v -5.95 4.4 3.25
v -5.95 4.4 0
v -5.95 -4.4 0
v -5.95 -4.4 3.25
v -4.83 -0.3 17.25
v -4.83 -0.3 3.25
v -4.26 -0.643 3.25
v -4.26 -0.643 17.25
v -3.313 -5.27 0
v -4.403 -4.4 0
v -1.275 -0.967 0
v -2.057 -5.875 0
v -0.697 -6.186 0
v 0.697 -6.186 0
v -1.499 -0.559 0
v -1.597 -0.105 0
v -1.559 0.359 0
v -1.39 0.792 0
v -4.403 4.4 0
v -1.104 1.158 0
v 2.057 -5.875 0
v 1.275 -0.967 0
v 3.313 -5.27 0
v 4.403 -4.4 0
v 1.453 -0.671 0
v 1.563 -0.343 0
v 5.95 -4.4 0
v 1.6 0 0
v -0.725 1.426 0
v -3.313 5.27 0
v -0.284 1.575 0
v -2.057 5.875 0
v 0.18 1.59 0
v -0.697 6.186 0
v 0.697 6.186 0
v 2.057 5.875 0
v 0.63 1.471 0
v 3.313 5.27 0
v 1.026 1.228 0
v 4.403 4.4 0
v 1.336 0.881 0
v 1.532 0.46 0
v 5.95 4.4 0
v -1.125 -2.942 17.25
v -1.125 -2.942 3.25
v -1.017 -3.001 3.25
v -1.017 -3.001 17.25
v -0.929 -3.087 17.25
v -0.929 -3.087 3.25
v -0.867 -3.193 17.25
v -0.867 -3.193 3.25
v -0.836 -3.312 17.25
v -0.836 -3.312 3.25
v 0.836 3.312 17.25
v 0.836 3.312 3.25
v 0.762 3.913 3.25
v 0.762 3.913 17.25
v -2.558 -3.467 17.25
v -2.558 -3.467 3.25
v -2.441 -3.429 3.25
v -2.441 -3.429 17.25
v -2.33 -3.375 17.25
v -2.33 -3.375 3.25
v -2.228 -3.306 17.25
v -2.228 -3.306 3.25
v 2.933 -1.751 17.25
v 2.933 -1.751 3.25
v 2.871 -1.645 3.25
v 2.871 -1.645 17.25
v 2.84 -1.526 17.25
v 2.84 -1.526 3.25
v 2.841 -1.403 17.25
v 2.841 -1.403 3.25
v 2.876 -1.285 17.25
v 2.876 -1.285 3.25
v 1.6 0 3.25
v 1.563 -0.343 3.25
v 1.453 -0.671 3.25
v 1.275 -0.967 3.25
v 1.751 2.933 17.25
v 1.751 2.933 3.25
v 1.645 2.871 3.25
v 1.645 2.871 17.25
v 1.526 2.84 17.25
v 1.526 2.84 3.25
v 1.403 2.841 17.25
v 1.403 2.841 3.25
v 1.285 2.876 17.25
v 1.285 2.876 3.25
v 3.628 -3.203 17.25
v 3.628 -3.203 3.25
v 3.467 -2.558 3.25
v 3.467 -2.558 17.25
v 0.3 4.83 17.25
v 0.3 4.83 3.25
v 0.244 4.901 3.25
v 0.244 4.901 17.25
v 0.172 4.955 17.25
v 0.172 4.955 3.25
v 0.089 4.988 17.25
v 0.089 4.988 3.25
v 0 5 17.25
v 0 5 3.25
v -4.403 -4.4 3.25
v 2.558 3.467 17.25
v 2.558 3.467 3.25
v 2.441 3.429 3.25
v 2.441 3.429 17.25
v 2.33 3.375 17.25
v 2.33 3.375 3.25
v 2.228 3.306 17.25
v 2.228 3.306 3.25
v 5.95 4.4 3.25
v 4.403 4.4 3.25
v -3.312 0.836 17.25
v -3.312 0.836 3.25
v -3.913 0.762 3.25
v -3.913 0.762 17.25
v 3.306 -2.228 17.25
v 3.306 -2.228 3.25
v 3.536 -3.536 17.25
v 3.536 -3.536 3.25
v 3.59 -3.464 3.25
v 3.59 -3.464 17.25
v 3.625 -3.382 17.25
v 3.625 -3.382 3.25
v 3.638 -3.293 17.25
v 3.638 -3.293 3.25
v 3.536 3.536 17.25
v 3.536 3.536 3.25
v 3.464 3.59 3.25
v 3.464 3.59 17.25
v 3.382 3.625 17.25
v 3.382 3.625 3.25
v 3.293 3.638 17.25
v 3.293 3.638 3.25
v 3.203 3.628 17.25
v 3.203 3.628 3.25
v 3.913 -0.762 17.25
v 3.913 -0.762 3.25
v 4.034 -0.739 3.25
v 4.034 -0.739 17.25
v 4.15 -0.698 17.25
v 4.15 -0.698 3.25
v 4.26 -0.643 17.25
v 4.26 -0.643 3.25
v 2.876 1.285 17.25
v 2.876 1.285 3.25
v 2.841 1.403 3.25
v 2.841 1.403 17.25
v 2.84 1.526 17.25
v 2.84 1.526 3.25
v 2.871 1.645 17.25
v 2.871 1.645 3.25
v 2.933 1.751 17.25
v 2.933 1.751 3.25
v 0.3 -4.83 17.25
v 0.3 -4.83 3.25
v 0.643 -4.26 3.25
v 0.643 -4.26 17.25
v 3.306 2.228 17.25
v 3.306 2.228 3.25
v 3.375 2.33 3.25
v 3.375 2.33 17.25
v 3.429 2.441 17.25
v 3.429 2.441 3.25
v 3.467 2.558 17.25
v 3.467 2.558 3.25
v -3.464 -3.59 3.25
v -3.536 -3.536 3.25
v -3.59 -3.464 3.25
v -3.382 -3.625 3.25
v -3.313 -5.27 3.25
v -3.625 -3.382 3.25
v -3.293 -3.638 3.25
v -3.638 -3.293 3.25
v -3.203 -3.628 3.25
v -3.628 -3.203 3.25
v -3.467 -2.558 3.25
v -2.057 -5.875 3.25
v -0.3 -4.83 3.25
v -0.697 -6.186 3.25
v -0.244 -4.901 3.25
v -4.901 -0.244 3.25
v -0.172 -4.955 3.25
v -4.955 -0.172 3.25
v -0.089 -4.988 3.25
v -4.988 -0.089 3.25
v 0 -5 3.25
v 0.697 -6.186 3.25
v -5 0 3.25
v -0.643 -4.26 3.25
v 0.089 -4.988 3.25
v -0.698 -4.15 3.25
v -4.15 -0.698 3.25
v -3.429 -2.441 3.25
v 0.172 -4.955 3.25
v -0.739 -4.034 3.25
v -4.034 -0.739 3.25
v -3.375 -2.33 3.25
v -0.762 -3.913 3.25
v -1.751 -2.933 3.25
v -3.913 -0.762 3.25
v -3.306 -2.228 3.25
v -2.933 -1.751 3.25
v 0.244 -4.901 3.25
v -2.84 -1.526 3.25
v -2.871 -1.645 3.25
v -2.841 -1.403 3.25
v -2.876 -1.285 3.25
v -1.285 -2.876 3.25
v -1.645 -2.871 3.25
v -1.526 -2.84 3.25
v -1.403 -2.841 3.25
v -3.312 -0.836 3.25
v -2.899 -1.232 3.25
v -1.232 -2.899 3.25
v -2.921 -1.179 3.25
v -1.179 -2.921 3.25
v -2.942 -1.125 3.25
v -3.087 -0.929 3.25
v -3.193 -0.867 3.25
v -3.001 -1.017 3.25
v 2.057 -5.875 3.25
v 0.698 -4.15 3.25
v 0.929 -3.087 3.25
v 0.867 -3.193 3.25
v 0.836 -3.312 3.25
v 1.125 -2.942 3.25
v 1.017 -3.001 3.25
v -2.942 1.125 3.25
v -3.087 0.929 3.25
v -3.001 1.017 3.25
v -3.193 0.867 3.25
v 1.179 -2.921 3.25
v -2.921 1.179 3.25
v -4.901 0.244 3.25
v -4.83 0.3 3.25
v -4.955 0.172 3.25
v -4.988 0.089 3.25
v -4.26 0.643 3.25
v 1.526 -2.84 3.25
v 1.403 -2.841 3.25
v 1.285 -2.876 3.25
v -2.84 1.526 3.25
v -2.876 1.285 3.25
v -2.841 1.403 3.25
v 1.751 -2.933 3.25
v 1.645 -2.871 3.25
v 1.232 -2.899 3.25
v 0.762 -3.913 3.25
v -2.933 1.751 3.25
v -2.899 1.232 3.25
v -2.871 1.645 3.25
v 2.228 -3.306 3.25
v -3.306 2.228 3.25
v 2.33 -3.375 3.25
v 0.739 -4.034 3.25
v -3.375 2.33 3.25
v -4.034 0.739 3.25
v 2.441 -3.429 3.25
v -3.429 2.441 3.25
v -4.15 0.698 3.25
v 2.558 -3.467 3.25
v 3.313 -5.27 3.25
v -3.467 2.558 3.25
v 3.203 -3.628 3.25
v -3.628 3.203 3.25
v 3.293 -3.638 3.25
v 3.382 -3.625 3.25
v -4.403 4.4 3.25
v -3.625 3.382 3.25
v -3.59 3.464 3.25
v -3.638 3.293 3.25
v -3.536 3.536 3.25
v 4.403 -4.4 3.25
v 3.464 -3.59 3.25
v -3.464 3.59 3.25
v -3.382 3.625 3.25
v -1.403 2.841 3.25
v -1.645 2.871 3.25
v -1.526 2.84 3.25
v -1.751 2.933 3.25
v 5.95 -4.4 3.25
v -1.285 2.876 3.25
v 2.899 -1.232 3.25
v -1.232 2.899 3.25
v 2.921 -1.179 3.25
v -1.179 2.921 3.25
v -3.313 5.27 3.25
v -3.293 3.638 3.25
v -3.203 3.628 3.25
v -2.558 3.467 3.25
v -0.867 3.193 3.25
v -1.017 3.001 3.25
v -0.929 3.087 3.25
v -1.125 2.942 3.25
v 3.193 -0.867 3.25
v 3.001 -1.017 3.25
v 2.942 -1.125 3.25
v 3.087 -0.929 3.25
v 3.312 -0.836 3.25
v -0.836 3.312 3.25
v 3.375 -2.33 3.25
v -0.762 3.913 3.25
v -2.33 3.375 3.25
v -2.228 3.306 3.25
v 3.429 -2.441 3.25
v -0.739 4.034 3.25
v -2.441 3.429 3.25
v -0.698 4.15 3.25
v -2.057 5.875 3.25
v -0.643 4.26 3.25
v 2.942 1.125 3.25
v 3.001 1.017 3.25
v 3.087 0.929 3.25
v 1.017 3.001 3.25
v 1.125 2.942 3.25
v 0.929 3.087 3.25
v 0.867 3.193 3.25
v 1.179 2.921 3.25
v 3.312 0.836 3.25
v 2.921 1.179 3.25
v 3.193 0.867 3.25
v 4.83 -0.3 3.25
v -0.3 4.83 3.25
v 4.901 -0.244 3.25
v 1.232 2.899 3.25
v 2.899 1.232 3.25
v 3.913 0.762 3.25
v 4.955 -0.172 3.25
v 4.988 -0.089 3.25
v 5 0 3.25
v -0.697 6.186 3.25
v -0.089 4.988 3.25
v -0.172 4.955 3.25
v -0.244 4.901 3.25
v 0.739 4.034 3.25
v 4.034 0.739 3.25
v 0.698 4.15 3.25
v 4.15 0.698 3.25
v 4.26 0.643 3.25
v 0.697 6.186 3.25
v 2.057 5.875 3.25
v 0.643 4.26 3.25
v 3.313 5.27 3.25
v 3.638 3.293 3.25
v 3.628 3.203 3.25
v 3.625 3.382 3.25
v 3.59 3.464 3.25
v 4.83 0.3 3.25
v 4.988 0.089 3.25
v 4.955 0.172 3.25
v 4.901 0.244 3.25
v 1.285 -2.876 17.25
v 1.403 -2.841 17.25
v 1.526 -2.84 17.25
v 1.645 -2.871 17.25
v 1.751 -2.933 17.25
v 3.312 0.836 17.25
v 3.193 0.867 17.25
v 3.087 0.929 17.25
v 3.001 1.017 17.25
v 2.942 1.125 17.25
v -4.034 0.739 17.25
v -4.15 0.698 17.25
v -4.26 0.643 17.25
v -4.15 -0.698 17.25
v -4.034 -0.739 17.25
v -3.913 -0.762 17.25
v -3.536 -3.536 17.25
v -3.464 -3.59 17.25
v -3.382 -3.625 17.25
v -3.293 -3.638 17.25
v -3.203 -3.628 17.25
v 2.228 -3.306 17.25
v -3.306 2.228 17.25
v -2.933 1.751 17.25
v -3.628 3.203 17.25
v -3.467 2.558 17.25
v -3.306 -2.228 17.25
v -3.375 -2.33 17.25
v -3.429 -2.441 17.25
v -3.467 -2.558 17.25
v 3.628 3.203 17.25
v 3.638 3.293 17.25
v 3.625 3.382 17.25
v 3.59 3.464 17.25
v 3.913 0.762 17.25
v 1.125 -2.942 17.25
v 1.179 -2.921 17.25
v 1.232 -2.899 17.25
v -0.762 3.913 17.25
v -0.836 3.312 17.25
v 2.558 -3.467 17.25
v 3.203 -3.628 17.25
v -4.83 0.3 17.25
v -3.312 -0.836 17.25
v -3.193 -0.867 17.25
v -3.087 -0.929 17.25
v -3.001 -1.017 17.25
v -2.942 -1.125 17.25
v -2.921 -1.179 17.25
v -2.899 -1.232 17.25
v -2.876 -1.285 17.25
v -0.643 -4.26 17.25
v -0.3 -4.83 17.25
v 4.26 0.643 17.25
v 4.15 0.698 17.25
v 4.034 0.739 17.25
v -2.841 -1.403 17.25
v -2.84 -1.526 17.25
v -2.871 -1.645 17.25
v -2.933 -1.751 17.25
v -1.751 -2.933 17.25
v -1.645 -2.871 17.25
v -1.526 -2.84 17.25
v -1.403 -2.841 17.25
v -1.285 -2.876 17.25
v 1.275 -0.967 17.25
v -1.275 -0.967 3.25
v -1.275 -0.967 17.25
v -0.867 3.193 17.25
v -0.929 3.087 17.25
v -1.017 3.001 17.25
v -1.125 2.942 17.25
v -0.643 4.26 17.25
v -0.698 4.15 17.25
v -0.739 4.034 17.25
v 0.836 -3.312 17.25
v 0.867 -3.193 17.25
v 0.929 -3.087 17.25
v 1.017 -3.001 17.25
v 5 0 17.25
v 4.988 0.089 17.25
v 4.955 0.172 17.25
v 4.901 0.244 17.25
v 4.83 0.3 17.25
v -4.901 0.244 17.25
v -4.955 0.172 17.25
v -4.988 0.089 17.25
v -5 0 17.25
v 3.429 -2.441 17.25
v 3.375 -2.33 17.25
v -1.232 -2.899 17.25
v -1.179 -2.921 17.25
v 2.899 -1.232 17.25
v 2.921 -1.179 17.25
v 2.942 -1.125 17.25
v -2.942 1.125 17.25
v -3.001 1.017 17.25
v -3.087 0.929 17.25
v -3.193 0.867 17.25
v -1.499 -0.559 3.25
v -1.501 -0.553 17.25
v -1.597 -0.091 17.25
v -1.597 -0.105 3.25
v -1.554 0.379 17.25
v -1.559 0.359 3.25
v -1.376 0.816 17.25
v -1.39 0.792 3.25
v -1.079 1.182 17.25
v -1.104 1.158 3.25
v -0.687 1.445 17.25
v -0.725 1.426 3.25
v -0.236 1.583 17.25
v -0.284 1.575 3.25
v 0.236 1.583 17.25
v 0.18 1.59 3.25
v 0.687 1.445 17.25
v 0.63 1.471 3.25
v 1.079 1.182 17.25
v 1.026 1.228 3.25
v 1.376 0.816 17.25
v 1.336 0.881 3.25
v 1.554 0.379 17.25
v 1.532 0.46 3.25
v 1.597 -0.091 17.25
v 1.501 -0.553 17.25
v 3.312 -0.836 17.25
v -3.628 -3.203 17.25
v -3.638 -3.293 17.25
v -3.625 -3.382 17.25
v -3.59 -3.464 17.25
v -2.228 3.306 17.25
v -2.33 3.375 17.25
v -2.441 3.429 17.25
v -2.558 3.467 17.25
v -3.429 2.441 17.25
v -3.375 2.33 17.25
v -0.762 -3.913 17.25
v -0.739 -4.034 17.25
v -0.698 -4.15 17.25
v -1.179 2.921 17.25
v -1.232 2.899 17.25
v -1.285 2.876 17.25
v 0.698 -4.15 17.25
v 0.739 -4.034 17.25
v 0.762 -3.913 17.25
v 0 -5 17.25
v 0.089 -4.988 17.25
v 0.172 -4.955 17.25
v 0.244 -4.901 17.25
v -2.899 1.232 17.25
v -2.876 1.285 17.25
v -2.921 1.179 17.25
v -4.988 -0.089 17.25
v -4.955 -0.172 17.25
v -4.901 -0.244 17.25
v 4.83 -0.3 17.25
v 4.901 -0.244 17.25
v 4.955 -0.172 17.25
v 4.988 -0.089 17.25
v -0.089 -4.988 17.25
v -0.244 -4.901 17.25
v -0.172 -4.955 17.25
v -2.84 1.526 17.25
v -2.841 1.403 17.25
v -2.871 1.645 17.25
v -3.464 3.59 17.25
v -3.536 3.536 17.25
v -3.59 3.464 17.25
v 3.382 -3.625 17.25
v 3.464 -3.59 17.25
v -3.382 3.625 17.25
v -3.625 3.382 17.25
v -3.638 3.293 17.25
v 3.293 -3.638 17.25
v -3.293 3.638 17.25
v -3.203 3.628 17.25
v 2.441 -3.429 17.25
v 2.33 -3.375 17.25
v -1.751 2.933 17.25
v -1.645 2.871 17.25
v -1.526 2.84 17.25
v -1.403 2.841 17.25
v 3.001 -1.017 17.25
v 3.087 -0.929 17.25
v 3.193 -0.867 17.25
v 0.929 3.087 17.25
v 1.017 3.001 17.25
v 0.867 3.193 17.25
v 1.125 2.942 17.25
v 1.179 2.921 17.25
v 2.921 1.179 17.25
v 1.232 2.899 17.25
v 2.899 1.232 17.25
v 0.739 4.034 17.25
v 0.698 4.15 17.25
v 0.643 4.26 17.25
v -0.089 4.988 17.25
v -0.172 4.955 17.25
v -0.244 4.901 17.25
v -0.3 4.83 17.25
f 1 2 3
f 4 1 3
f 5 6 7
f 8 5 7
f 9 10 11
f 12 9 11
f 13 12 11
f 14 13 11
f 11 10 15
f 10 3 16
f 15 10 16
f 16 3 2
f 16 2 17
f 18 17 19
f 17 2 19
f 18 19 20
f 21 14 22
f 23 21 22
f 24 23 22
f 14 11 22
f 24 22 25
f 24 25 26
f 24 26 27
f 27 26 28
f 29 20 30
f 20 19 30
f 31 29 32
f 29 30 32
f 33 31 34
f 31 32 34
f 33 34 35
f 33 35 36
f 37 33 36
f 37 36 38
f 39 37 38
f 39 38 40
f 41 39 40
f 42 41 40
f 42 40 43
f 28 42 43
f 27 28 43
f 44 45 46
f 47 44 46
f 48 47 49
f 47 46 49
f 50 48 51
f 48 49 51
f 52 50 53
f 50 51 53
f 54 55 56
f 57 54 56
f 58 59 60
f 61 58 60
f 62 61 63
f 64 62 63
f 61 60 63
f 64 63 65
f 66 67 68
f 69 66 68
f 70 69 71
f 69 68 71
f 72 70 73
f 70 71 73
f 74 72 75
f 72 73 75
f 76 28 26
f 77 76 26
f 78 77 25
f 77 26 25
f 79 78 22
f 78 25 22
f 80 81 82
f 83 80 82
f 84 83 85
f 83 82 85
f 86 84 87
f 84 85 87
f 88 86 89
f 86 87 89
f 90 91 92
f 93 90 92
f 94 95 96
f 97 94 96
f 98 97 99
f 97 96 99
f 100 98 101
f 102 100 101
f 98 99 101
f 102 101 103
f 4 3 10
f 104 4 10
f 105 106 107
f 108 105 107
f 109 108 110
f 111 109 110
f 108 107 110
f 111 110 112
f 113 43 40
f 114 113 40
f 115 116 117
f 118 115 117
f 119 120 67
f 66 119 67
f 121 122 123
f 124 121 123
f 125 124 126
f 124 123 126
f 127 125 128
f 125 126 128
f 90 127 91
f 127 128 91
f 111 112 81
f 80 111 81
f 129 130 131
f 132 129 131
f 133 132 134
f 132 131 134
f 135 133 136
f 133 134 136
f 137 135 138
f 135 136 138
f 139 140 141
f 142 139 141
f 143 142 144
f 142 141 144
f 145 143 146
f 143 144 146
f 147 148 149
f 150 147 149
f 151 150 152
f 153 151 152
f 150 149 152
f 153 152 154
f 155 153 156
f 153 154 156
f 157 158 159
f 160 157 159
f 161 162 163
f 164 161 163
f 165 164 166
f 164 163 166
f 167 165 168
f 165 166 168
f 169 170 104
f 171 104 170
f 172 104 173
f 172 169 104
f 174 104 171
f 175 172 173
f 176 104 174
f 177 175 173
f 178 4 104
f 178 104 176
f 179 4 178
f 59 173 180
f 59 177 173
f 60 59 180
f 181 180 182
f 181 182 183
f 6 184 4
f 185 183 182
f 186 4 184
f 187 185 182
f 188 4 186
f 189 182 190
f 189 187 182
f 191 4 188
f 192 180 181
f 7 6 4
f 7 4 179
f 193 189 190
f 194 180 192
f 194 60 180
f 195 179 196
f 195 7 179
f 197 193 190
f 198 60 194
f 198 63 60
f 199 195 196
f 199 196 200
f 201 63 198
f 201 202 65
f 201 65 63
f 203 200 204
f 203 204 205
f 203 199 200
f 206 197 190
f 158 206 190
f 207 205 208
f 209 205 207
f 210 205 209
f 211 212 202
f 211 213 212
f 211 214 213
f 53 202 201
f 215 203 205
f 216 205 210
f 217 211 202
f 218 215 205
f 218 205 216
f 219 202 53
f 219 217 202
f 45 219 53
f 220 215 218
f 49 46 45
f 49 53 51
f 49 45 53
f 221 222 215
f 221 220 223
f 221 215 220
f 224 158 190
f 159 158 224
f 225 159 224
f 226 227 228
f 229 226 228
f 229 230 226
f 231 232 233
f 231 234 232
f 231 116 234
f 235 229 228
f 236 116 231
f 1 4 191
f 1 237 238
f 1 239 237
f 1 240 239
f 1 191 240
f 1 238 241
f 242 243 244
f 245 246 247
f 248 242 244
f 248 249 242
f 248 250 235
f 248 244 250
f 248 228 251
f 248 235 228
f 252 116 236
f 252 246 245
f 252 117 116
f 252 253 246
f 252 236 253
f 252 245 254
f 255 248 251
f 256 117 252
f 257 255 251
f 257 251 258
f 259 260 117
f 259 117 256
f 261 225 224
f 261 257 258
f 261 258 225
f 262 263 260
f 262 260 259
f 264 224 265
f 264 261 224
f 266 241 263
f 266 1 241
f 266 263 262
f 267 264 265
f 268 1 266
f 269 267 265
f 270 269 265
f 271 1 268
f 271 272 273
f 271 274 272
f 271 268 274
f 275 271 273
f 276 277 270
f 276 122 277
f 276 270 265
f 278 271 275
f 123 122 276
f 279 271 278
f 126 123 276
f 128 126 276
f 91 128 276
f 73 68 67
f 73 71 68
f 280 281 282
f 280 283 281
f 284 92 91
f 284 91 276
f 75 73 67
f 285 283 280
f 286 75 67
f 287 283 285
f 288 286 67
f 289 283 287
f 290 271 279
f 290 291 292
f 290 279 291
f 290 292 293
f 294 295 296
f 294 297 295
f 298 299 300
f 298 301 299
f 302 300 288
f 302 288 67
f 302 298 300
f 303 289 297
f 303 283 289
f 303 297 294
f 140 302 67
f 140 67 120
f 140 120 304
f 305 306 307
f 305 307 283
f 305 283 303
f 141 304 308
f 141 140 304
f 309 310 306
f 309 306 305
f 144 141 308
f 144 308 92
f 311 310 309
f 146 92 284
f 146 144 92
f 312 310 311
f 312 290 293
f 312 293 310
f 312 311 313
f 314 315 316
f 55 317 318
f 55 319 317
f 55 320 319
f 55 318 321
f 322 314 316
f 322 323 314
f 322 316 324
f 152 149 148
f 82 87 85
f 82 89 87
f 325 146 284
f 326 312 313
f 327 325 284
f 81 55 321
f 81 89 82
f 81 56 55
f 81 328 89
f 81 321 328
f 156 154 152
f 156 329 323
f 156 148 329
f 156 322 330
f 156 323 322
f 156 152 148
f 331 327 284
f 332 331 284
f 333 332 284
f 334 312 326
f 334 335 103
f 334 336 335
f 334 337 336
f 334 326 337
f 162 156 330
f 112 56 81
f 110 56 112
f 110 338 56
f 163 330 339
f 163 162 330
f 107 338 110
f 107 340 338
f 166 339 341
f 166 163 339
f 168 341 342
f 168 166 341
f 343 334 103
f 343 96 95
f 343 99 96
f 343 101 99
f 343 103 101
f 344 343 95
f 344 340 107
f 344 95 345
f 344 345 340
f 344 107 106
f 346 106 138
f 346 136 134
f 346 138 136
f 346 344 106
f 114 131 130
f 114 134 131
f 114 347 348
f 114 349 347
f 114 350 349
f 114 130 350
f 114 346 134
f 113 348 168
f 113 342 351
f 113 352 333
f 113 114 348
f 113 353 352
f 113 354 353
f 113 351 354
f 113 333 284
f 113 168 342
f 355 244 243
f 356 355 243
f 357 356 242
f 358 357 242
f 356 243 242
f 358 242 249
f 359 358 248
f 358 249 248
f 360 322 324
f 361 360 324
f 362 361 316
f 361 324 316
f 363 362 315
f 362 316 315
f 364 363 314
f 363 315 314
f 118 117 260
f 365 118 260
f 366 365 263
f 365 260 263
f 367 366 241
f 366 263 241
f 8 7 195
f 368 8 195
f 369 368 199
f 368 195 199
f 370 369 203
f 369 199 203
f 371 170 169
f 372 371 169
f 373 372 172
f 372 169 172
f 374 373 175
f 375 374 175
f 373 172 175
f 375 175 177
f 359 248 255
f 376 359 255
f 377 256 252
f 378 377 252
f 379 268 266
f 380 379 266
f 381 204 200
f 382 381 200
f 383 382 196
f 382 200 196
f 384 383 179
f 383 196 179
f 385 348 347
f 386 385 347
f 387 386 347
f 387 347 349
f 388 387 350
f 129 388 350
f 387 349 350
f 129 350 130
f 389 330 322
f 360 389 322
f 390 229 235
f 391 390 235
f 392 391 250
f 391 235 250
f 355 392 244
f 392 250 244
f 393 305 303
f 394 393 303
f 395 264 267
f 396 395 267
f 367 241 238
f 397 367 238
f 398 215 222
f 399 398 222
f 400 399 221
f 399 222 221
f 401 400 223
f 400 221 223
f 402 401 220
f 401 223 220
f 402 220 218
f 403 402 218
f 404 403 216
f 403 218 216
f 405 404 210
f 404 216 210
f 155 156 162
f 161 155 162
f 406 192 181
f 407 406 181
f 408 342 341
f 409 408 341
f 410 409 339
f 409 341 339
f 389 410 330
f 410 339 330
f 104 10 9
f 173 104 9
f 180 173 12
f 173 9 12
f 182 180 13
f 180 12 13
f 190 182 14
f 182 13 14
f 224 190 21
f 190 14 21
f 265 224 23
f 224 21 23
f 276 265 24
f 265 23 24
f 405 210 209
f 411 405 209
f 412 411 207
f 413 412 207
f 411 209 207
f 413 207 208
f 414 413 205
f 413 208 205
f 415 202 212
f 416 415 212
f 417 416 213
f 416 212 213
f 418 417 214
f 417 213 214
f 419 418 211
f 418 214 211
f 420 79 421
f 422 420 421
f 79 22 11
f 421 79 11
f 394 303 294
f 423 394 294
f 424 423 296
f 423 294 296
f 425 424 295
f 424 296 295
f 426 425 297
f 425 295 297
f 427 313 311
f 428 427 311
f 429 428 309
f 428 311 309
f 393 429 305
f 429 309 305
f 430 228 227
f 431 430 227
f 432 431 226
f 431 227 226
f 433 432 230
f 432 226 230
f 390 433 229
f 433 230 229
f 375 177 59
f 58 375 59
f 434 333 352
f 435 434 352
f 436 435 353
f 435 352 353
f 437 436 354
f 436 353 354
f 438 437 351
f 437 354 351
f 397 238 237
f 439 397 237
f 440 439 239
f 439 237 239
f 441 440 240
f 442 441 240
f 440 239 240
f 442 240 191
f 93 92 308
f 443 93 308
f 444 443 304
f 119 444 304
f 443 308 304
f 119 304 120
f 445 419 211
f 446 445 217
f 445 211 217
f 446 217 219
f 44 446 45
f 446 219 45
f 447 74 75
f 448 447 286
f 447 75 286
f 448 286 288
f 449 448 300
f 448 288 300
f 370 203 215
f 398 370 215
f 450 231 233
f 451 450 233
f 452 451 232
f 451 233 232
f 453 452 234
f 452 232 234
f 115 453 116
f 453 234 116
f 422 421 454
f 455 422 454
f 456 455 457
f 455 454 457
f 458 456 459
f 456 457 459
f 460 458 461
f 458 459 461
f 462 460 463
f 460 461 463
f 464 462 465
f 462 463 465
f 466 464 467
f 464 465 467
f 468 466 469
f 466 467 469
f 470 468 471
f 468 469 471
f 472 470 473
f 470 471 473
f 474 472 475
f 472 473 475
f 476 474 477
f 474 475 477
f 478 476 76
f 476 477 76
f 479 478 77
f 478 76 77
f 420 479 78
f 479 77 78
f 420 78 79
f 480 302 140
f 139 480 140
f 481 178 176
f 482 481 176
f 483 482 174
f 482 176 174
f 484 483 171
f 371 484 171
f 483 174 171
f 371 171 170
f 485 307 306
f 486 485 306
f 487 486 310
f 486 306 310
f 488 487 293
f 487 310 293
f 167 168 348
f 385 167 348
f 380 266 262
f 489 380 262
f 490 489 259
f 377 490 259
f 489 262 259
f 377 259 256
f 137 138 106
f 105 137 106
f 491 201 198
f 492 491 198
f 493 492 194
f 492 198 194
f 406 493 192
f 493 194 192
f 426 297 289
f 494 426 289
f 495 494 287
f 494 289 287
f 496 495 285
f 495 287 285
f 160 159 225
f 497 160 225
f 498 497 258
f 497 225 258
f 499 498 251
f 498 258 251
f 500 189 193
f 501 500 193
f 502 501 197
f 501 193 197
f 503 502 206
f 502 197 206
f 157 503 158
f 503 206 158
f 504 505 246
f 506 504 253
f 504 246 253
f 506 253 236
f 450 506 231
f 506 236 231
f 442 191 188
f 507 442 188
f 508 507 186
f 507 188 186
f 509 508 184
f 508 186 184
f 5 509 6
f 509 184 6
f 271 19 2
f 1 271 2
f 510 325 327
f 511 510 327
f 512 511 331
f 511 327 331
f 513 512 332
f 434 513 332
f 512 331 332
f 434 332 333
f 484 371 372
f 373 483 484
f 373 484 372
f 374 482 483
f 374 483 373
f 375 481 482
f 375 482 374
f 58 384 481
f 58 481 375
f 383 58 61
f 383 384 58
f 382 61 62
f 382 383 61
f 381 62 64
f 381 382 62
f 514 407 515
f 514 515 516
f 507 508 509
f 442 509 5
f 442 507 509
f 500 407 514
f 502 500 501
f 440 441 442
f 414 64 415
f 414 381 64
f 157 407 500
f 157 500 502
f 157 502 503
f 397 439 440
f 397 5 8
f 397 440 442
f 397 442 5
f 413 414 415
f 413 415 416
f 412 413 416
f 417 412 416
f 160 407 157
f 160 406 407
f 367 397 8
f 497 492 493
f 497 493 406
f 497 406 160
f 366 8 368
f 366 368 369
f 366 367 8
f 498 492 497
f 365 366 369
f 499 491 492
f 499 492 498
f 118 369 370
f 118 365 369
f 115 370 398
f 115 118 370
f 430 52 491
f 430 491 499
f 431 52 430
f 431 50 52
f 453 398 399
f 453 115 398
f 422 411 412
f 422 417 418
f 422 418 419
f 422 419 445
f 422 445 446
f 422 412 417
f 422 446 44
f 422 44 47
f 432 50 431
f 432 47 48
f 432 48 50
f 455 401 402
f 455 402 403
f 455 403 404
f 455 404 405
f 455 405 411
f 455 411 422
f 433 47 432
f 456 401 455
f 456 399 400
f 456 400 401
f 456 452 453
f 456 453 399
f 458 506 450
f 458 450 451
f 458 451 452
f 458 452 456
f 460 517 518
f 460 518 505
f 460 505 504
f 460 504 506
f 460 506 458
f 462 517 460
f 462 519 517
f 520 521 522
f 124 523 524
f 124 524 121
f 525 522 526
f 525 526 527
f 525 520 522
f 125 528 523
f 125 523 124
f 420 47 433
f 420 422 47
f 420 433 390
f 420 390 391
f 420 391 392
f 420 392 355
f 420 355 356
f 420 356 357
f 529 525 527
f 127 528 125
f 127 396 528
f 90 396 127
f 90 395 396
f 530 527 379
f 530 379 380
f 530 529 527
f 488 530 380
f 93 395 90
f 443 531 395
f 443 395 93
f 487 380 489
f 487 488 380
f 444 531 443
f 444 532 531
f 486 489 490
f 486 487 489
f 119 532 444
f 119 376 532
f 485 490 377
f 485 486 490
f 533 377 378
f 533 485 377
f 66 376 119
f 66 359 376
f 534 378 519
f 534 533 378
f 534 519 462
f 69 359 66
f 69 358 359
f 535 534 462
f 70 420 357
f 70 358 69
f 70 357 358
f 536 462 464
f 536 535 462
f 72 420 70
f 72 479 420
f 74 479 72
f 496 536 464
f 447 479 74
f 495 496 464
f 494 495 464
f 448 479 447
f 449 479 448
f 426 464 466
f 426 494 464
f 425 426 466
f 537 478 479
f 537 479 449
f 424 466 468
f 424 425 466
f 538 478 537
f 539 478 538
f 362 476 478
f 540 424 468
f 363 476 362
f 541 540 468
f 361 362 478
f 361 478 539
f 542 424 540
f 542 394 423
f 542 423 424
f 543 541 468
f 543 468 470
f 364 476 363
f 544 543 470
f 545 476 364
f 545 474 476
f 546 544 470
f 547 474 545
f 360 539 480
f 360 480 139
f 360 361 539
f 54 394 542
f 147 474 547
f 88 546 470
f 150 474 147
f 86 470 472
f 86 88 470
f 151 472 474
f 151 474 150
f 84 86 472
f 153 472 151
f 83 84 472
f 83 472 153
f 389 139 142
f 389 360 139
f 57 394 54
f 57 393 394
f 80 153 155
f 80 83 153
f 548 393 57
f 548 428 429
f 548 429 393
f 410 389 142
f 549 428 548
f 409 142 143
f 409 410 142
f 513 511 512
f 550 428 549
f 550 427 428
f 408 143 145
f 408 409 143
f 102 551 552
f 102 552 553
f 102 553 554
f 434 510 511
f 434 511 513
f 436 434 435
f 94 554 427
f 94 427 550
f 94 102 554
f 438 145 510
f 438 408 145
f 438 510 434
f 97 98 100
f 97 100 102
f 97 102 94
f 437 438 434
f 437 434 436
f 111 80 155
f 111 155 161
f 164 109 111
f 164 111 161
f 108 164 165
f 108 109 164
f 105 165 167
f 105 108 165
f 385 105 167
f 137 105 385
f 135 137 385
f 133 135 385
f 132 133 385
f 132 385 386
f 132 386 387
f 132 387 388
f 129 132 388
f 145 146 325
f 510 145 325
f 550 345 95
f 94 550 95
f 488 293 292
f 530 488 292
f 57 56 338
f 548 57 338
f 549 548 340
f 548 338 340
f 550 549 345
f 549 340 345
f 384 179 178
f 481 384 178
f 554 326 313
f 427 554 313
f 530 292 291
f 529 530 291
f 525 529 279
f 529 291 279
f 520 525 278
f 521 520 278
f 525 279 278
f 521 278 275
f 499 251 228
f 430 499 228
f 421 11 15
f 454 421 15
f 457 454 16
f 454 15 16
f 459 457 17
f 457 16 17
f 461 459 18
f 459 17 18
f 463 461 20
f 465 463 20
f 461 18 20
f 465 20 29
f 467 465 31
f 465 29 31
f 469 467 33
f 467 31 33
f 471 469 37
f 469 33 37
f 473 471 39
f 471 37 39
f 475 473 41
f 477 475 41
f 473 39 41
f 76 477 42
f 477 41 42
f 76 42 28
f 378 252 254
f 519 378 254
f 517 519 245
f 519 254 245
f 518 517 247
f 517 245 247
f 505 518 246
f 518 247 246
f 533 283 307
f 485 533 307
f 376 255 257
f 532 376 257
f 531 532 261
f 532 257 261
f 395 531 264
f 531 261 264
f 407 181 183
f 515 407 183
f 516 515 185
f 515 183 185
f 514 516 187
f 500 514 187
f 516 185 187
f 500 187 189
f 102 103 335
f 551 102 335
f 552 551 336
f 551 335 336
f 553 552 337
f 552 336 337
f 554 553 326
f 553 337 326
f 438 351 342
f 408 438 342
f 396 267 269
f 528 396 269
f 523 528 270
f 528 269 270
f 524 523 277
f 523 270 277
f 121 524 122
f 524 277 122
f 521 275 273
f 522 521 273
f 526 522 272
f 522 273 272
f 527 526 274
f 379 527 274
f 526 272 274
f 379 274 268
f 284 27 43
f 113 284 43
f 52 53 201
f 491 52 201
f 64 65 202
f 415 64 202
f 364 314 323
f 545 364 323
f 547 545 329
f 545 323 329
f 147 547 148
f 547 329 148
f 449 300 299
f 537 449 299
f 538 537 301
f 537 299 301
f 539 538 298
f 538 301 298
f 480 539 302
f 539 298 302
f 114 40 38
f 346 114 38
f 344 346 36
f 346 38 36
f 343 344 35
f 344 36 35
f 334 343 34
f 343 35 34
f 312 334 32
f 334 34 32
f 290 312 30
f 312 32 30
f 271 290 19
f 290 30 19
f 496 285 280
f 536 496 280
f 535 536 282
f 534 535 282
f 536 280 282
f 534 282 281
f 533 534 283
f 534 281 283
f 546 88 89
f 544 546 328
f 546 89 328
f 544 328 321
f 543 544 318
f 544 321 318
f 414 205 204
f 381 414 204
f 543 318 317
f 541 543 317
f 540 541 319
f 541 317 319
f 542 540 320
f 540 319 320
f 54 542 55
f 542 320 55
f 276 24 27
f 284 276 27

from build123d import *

# Parameters (mm, degrees)
F0_R     = 5
F0_R_2   = 3.15
F0_R_3   = 2.55
F1_DEPTH = 3.25
F2_R     = 2.55
F3_DEPTH = 14


# Not quite as in the source:
# - a feature names something its author has since deleted; it is built from what else it names


with BuildPart() as f1:
    # F0 (on Top) → F1 (new body)
    with BuildSketch(Plane.XY):
        with BuildLine():
            Line((-5.95, -4.4), (-4.4034787385, -4.4))
            ThreePointArc((-4.4034787385, -4.4), (0, -6.225), (4.4034787385, -4.4))
            Line((4.4034787385, -4.4), (5.95, -4.4))
            Line((5.95, -4.4), (5.95, 4.4))
            Line((5.95, 4.4), (4.4034787385, 4.4))
            ThreePointArc((4.4034787385, 4.4), (0, 6.225), (-4.4034787385, 4.4))
            Line((-4.4034787385, 4.4), (-5.95, 4.4))
            Line((-5.95, 4.4), (-5.95, -4.4))
        make_face()
        Circle(F0_R, mode=Mode.SUBTRACT)
        Circle(F0_R)
        Circle(F0_R_2, mode=Mode.SUBTRACT)
        Circle(F0_R_2)
        Circle(F0_R_3, mode=Mode.SUBTRACT)
        Circle(F0_R_3)
        with BuildLine():
            ThreePointArc((-1.275, -0.9666307465), (-0.5099019514, 1.5165750888), (1.6, 0))
            ThreePointArc((1.6, 0), (1.5165750888, -0.5099019514), (1.275, -0.9666307465))
            ThreePointArc((1.275, -0.9666307465), (0, -1.6), (-1.275, -0.9666307465))
        make_face(mode=Mode.SUBTRACT)
        with BuildLine():
            Line((1.275, -0.9666307465), (-1.275, -0.9666307465))
            ThreePointArc((-1.275, -0.9666307465), (0, -1.6), (1.275, -0.9666307465))
        make_face()
    extrude(amount=F1_DEPTH)

    # F2 (on face) → F3 (join)
    with BuildSketch(Plane.XY.offset(3.25)):
        with BuildLine():
            ThreePointArc((-4.8302633262, 0.3000085552), (-4.9546244936, 0.172348246), (-5, 0))
            ThreePointArc((-5, 0), (-4.9546244936, -0.172348246), (-4.8302633262, -0.3000085552))
            Line((-4.8302633262, -0.3000085552), (-4.2601369618, -0.6425750355))
            ThreePointArc((-4.2601369618, -0.6425750355), (-4.0929165173, -0.7205512094), (-3.9131380826, -0.7620563314))
            Line((-3.9131380826, -0.7620563314), (-3.3117988826, -0.835891501))
            ThreePointArc((-3.3117988826, -0.835891501), (-3.0868883315, -0.9291389359), (-2.9422567869, -1.125))
            ThreePointArc((-2.9422567869, -1.125), (-3.15, 0), (-2.9422567869, 1.125))
            ThreePointArc((-2.9422567869, 1.125), (-3.0868883315, 0.9291389359), (-3.3117988826, 0.835891501))
            Line((-3.3117988826, 0.835891501), (-3.9131380826, 0.7620563314))
            ThreePointArc((-3.9131380826, 0.7620563314), (-4.0929165173, 0.7205512094), (-4.2601369618, 0.6425750355))
            Line((-4.2601369618, 0.6425750355), (-4.8302633262, 0.3000085552))
        make_face()
        with BuildLine():
            ThreePointArc((-3.2033738691, 3.6276500367), (-3.3815799641, 3.6253171911), (-3.5355339059, 3.5355339059))
            ThreePointArc((-3.5355339059, 3.5355339059), (-3.6253171911, 3.3815799641), (-3.6276500367, 3.2033738691))
            Line((-3.6276500367, 3.2033738691), (-3.4667408995, 2.5580025694))
            ThreePointArc((-3.4667408995, 2.5580025694), (-3.4036356706, 2.3846223779), (-3.3058616735, 2.2281512744))
            Line((-3.3058616735, 2.2281512744), (-2.9328599965, 1.7507308991))
            ThreePointArc((-2.9328599965, 1.7507308991), (-2.8397601142, 1.5257592297), (-2.8759848548, 1.2849945972))
            ThreePointArc((-2.8759848548, 1.2849945972), (-2.2273863607, 2.2273863607), (-1.2849945972, 2.8759848548))
            ThreePointArc((-1.2849945972, 2.8759848548), (-1.5257592297, 2.8397601142), (-1.7507308991, 2.9328599965))
            Line((-1.7507308991, 2.9328599965), (-2.2281512744, 3.3058616735))
            ThreePointArc((-2.2281512744, 3.3058616735), (-2.3846223779, 3.4036356706), (-2.5580025694, 3.4667408995))
            Line((-2.5580025694, 3.4667408995), (-3.2033738691, 3.6276500367))
        make_face()
        with BuildLine():
            ThreePointArc((0.3000085552, 4.8302633262), (0.172348246, 4.9546244936), (0, 5))
            ThreePointArc((0, 5), (-0.172348246, 4.9546244936), (-0.3000085552, 4.8302633262))
            Line((-0.3000085552, 4.8302633262), (-0.6425750355, 4.2601369618))
            ThreePointArc((-0.6425750355, 4.2601369618), (-0.7205512094, 4.0929165173), (-0.7620563314, 3.9131380826))
            Line((-0.7620563314, 3.9131380826), (-0.835891501, 3.3117988826))
            ThreePointArc((-0.835891501, 3.3117988826), (-0.9291389359, 3.0868883315), (-1.125, 2.9422567869))
            ThreePointArc((-1.125, 2.9422567869), (0, 3.15), (1.125, 2.9422567869))
            ThreePointArc((1.125, 2.9422567869), (0.9291389359, 3.0868883315), (0.835891501, 3.3117988826))
            Line((0.835891501, 3.3117988826), (0.7620563314, 3.9131380826))
            ThreePointArc((0.7620563314, 3.9131380826), (0.7205512094, 4.0929165173), (0.6425750355, 4.2601369618))
            Line((0.6425750355, 4.2601369618), (0.3000085552, 4.8302633262))
        make_face()
        with BuildLine():
            ThreePointArc((3.2033738691, -3.6276500367), (3.3815799667, -3.6253171904), (3.5355339096, -3.5355339023))
            ThreePointArc((3.5355339096, -3.5355339023), (3.6253171918, -3.3815799616), (3.6276500367, -3.2033738691))
            Line((3.6276500367, -3.2033738691), (3.4667408995, -2.5580025694))
            ThreePointArc((3.4667408995, -2.5580025694), (3.4036356706, -2.3846223779), (3.3058616735, -2.2281512744))
            Line((3.3058616735, -2.2281512744), (2.9328599965, -1.7507308991))
            ThreePointArc((2.9328599965, -1.7507308991), (2.8397601142, -1.5257592297), (2.8759848548, -1.2849945972))
            ThreePointArc((2.8759848548, -1.2849945972), (2.2273863607, -2.2273863607), (1.2849945972, -2.8759848548))
            ThreePointArc((1.2849945972, -2.8759848548), (1.5257592297, -2.8397601142), (1.7507308991, -2.9328599965))
            Line((1.7507308991, -2.9328599965), (2.2281512744, -3.3058616735))
            ThreePointArc((2.2281512744, -3.3058616735), (2.3846223779, -3.4036356706), (2.5580025694, -3.4667408995))
            Line((2.5580025694, -3.4667408995), (3.2033738691, -3.6276500367))
        make_face()
        with BuildLine():
            ThreePointArc((-0.3000085552, -4.8302633262), (-0.172348246, -4.9546244936), (0, -5))
            ThreePointArc((0, -5), (0.172348246, -4.9546244936), (0.3000085552, -4.8302633262))
            Line((0.3000085552, -4.8302633262), (0.6425750355, -4.2601369618))
            ThreePointArc((0.6425750355, -4.2601369618), (0.7205512094, -4.0929165173), (0.7620563314, -3.9131380826))
            Line((0.7620563314, -3.9131380826), (0.835891501, -3.3117988826))
            ThreePointArc((0.835891501, -3.3117988826), (0.9291389359, -3.0868883315), (1.125, -2.9422567869))
            ThreePointArc((1.125, -2.9422567869), (0, -3.15), (-1.125, -2.9422567869))
            ThreePointArc((-1.125, -2.9422567869), (-0.9291389359, -3.0868883315), (-0.835891501, -3.3117988826))
            Line((-0.835891501, -3.3117988826), (-0.7620563314, -3.9131380826))
            ThreePointArc((-0.7620563314, -3.9131380826), (-0.7205512094, -4.0929165173), (-0.6425750355, -4.2601369618))
            Line((-0.6425750355, -4.2601369618), (-0.3000085552, -4.8302633262))
        make_face()
        with BuildLine():
            ThreePointArc((-3.6276500367, -3.2033738691), (-3.6253171911, -3.3815799641), (-3.5355339059, -3.5355339059))
            ThreePointArc((-3.5355339059, -3.5355339059), (-3.3815799641, -3.6253171911), (-3.2033738691, -3.6276500367))
            Line((-3.2033738691, -3.6276500367), (-2.5580025694, -3.4667408995))
            ThreePointArc((-2.5580025694, -3.4667408995), (-2.3846223779, -3.4036356706), (-2.2281512744, -3.3058616735))
            Line((-2.2281512744, -3.3058616735), (-1.7507308991, -2.9328599965))
            ThreePointArc((-1.7507308991, -2.9328599965), (-1.5257592297, -2.8397601142), (-1.2849945972, -2.8759848548))
            ThreePointArc((-1.2849945972, -2.8759848548), (-2.2273863607, -2.2273863607), (-2.8759848548, -1.2849945972))
            ThreePointArc((-2.8759848548, -1.2849945972), (-2.8397601142, -1.5257592297), (-2.9328599965, -1.7507308991))
            Line((-2.9328599965, -1.7507308991), (-3.3058616735, -2.2281512744))
            ThreePointArc((-3.3058616735, -2.2281512744), (-3.4036356706, -2.3846223779), (-3.4667408995, -2.5580025694))
            Line((-3.4667408995, -2.5580025694), (-3.6276500367, -3.2033738691))
        make_face()
        with BuildLine():
            ThreePointArc((2.8759848548, -1.2849945972), (2.9102205274, -1.205452812), (2.9422567869, -1.125))
            ThreePointArc((2.9422567869, -1.125), (3.0976288414, -0.5720101054), (3.15, 0))
            ThreePointArc((3.15, 0), (3.0976288414, 0.5720101054), (2.9422567869, 1.125))
            ThreePointArc((2.9422567869, 1.125), (2.9102205274, 1.205452812), (2.8759848548, 1.2849945972))
            ThreePointArc((2.8759848548, 1.2849945972), (2.2273863607, 2.2273863607), (1.2849945972, 2.8759848548))
            ThreePointArc((1.2849945972, 2.8759848548), (1.205452812, 2.9102205274), (1.125, 2.9422567869))
            ThreePointArc((1.125, 2.9422567869), (0, 3.15), (-1.125, 2.9422567869))
            ThreePointArc((-1.125, 2.9422567869), (-1.205452812, 2.9102205274), (-1.2849945972, 2.8759848548))
            ThreePointArc((-1.2849945972, 2.8759848548), (-2.2273863607, 2.2273863607), (-2.8759848548, 1.2849945972))
            ThreePointArc((-2.8759848548, 1.2849945972), (-2.9102205274, 1.205452812), (-2.9422567869, 1.125))
            ThreePointArc((-2.9422567869, 1.125), (-3.15, 0), (-2.9422567869, -1.125))
            ThreePointArc((-2.9422567869, -1.125), (-2.9102205274, -1.205452812), (-2.8759848548, -1.2849945972))
            ThreePointArc((-2.8759848548, -1.2849945972), (-2.2273863607, -2.2273863607), (-1.2849945972, -2.8759848548))
            ThreePointArc((-1.2849945972, -2.8759848548), (-1.205452812, -2.9102205274), (-1.125, -2.9422567869))
            ThreePointArc((-1.125, -2.9422567869), (0, -3.15), (1.125, -2.9422567869))
            ThreePointArc((1.125, -2.9422567869), (1.205452812, -2.9102205274), (1.2849945972, -2.8759848548))
            ThreePointArc((1.2849945972, -2.8759848548), (2.2273863607, -2.2273863607), (2.8759848548, -1.2849945972))
        make_face()
        Circle(F2_R, mode=Mode.SUBTRACT)
        Circle(F2_R)
        with BuildLine():
            ThreePointArc((-1.275, -0.9666307465), (0, 1.6), (1.275, -0.9666307465))
            Line((1.275, -0.9666307465), (-1.275, -0.9666307465))
        make_face(mode=Mode.SUBTRACT)
        with BuildLine():
            ThreePointArc((3.6276500367, 3.2033738691), (3.6253171915, 3.3815799629), (3.5355339078, 3.5355339041))
            ThreePointArc((3.5355339078, 3.5355339041), (3.3815799654, 3.6253171908), (3.2033738691, 3.6276500367))
            Line((3.2033738691, 3.6276500367), (2.5580025694, 3.4667408995))
            ThreePointArc((2.5580025694, 3.4667408995), (2.3846223779, 3.4036356706), (2.2281512744, 3.3058616735))
            Line((2.2281512744, 3.3058616735), (1.7507308991, 2.9328599965))
            ThreePointArc((1.7507308991, 2.9328599965), (1.5257592297, 2.8397601142), (1.2849945972, 2.8759848548))
            ThreePointArc((1.2849945972, 2.8759848548), (2.2273863607, 2.2273863607), (2.8759848548, 1.2849945972))
            ThreePointArc((2.8759848548, 1.2849945972), (2.8397601142, 1.5257592297), (2.9328599965, 1.7507308991))
            Line((2.9328599965, 1.7507308991), (3.3058616735, 2.2281512744))
            ThreePointArc((3.3058616735, 2.2281512744), (3.4036356706, 2.3846223779), (3.4667408995, 2.5580025694))
            Line((3.4667408995, 2.5580025694), (3.6276500367, 3.2033738691))
        make_face()
        with BuildLine():
            ThreePointArc((4.8302633262, -0.3000085552), (4.9546244936, -0.172348246), (5, 0))
            ThreePointArc((5, 0), (4.9546244936, 0.172348246), (4.8302633262, 0.3000085552))
            Line((4.8302633262, 0.3000085552), (4.2601369618, 0.6425750355))
            ThreePointArc((4.2601369618, 0.6425750355), (4.0929165173, 0.7205512094), (3.9131380826, 0.7620563314))
            Line((3.9131380826, 0.7620563314), (3.3117988826, 0.835891501))
            ThreePointArc((3.3117988826, 0.835891501), (3.0868883315, 0.9291389359), (2.9422567869, 1.125))
            ThreePointArc((2.9422567869, 1.125), (3.0976288414, 0.5720101054), (3.15, 0))
            ThreePointArc((3.15, 0), (3.0976288414, -0.5720101054), (2.9422567869, -1.125))
            ThreePointArc((2.9422567869, -1.125), (3.0868883315, -0.9291389359), (3.3117988826, -0.835891501))
            Line((3.3117988826, -0.835891501), (3.9131380826, -0.7620563314))
            ThreePointArc((3.9131380826, -0.7620563314), (4.0929165173, -0.7205512094), (4.2601369618, -0.6425750355))
            Line((4.2601369618, -0.6425750355), (4.8302633262, -0.3000085552))
        make_face()
    extrude(amount=F3_DEPTH)


solid = f1.part
